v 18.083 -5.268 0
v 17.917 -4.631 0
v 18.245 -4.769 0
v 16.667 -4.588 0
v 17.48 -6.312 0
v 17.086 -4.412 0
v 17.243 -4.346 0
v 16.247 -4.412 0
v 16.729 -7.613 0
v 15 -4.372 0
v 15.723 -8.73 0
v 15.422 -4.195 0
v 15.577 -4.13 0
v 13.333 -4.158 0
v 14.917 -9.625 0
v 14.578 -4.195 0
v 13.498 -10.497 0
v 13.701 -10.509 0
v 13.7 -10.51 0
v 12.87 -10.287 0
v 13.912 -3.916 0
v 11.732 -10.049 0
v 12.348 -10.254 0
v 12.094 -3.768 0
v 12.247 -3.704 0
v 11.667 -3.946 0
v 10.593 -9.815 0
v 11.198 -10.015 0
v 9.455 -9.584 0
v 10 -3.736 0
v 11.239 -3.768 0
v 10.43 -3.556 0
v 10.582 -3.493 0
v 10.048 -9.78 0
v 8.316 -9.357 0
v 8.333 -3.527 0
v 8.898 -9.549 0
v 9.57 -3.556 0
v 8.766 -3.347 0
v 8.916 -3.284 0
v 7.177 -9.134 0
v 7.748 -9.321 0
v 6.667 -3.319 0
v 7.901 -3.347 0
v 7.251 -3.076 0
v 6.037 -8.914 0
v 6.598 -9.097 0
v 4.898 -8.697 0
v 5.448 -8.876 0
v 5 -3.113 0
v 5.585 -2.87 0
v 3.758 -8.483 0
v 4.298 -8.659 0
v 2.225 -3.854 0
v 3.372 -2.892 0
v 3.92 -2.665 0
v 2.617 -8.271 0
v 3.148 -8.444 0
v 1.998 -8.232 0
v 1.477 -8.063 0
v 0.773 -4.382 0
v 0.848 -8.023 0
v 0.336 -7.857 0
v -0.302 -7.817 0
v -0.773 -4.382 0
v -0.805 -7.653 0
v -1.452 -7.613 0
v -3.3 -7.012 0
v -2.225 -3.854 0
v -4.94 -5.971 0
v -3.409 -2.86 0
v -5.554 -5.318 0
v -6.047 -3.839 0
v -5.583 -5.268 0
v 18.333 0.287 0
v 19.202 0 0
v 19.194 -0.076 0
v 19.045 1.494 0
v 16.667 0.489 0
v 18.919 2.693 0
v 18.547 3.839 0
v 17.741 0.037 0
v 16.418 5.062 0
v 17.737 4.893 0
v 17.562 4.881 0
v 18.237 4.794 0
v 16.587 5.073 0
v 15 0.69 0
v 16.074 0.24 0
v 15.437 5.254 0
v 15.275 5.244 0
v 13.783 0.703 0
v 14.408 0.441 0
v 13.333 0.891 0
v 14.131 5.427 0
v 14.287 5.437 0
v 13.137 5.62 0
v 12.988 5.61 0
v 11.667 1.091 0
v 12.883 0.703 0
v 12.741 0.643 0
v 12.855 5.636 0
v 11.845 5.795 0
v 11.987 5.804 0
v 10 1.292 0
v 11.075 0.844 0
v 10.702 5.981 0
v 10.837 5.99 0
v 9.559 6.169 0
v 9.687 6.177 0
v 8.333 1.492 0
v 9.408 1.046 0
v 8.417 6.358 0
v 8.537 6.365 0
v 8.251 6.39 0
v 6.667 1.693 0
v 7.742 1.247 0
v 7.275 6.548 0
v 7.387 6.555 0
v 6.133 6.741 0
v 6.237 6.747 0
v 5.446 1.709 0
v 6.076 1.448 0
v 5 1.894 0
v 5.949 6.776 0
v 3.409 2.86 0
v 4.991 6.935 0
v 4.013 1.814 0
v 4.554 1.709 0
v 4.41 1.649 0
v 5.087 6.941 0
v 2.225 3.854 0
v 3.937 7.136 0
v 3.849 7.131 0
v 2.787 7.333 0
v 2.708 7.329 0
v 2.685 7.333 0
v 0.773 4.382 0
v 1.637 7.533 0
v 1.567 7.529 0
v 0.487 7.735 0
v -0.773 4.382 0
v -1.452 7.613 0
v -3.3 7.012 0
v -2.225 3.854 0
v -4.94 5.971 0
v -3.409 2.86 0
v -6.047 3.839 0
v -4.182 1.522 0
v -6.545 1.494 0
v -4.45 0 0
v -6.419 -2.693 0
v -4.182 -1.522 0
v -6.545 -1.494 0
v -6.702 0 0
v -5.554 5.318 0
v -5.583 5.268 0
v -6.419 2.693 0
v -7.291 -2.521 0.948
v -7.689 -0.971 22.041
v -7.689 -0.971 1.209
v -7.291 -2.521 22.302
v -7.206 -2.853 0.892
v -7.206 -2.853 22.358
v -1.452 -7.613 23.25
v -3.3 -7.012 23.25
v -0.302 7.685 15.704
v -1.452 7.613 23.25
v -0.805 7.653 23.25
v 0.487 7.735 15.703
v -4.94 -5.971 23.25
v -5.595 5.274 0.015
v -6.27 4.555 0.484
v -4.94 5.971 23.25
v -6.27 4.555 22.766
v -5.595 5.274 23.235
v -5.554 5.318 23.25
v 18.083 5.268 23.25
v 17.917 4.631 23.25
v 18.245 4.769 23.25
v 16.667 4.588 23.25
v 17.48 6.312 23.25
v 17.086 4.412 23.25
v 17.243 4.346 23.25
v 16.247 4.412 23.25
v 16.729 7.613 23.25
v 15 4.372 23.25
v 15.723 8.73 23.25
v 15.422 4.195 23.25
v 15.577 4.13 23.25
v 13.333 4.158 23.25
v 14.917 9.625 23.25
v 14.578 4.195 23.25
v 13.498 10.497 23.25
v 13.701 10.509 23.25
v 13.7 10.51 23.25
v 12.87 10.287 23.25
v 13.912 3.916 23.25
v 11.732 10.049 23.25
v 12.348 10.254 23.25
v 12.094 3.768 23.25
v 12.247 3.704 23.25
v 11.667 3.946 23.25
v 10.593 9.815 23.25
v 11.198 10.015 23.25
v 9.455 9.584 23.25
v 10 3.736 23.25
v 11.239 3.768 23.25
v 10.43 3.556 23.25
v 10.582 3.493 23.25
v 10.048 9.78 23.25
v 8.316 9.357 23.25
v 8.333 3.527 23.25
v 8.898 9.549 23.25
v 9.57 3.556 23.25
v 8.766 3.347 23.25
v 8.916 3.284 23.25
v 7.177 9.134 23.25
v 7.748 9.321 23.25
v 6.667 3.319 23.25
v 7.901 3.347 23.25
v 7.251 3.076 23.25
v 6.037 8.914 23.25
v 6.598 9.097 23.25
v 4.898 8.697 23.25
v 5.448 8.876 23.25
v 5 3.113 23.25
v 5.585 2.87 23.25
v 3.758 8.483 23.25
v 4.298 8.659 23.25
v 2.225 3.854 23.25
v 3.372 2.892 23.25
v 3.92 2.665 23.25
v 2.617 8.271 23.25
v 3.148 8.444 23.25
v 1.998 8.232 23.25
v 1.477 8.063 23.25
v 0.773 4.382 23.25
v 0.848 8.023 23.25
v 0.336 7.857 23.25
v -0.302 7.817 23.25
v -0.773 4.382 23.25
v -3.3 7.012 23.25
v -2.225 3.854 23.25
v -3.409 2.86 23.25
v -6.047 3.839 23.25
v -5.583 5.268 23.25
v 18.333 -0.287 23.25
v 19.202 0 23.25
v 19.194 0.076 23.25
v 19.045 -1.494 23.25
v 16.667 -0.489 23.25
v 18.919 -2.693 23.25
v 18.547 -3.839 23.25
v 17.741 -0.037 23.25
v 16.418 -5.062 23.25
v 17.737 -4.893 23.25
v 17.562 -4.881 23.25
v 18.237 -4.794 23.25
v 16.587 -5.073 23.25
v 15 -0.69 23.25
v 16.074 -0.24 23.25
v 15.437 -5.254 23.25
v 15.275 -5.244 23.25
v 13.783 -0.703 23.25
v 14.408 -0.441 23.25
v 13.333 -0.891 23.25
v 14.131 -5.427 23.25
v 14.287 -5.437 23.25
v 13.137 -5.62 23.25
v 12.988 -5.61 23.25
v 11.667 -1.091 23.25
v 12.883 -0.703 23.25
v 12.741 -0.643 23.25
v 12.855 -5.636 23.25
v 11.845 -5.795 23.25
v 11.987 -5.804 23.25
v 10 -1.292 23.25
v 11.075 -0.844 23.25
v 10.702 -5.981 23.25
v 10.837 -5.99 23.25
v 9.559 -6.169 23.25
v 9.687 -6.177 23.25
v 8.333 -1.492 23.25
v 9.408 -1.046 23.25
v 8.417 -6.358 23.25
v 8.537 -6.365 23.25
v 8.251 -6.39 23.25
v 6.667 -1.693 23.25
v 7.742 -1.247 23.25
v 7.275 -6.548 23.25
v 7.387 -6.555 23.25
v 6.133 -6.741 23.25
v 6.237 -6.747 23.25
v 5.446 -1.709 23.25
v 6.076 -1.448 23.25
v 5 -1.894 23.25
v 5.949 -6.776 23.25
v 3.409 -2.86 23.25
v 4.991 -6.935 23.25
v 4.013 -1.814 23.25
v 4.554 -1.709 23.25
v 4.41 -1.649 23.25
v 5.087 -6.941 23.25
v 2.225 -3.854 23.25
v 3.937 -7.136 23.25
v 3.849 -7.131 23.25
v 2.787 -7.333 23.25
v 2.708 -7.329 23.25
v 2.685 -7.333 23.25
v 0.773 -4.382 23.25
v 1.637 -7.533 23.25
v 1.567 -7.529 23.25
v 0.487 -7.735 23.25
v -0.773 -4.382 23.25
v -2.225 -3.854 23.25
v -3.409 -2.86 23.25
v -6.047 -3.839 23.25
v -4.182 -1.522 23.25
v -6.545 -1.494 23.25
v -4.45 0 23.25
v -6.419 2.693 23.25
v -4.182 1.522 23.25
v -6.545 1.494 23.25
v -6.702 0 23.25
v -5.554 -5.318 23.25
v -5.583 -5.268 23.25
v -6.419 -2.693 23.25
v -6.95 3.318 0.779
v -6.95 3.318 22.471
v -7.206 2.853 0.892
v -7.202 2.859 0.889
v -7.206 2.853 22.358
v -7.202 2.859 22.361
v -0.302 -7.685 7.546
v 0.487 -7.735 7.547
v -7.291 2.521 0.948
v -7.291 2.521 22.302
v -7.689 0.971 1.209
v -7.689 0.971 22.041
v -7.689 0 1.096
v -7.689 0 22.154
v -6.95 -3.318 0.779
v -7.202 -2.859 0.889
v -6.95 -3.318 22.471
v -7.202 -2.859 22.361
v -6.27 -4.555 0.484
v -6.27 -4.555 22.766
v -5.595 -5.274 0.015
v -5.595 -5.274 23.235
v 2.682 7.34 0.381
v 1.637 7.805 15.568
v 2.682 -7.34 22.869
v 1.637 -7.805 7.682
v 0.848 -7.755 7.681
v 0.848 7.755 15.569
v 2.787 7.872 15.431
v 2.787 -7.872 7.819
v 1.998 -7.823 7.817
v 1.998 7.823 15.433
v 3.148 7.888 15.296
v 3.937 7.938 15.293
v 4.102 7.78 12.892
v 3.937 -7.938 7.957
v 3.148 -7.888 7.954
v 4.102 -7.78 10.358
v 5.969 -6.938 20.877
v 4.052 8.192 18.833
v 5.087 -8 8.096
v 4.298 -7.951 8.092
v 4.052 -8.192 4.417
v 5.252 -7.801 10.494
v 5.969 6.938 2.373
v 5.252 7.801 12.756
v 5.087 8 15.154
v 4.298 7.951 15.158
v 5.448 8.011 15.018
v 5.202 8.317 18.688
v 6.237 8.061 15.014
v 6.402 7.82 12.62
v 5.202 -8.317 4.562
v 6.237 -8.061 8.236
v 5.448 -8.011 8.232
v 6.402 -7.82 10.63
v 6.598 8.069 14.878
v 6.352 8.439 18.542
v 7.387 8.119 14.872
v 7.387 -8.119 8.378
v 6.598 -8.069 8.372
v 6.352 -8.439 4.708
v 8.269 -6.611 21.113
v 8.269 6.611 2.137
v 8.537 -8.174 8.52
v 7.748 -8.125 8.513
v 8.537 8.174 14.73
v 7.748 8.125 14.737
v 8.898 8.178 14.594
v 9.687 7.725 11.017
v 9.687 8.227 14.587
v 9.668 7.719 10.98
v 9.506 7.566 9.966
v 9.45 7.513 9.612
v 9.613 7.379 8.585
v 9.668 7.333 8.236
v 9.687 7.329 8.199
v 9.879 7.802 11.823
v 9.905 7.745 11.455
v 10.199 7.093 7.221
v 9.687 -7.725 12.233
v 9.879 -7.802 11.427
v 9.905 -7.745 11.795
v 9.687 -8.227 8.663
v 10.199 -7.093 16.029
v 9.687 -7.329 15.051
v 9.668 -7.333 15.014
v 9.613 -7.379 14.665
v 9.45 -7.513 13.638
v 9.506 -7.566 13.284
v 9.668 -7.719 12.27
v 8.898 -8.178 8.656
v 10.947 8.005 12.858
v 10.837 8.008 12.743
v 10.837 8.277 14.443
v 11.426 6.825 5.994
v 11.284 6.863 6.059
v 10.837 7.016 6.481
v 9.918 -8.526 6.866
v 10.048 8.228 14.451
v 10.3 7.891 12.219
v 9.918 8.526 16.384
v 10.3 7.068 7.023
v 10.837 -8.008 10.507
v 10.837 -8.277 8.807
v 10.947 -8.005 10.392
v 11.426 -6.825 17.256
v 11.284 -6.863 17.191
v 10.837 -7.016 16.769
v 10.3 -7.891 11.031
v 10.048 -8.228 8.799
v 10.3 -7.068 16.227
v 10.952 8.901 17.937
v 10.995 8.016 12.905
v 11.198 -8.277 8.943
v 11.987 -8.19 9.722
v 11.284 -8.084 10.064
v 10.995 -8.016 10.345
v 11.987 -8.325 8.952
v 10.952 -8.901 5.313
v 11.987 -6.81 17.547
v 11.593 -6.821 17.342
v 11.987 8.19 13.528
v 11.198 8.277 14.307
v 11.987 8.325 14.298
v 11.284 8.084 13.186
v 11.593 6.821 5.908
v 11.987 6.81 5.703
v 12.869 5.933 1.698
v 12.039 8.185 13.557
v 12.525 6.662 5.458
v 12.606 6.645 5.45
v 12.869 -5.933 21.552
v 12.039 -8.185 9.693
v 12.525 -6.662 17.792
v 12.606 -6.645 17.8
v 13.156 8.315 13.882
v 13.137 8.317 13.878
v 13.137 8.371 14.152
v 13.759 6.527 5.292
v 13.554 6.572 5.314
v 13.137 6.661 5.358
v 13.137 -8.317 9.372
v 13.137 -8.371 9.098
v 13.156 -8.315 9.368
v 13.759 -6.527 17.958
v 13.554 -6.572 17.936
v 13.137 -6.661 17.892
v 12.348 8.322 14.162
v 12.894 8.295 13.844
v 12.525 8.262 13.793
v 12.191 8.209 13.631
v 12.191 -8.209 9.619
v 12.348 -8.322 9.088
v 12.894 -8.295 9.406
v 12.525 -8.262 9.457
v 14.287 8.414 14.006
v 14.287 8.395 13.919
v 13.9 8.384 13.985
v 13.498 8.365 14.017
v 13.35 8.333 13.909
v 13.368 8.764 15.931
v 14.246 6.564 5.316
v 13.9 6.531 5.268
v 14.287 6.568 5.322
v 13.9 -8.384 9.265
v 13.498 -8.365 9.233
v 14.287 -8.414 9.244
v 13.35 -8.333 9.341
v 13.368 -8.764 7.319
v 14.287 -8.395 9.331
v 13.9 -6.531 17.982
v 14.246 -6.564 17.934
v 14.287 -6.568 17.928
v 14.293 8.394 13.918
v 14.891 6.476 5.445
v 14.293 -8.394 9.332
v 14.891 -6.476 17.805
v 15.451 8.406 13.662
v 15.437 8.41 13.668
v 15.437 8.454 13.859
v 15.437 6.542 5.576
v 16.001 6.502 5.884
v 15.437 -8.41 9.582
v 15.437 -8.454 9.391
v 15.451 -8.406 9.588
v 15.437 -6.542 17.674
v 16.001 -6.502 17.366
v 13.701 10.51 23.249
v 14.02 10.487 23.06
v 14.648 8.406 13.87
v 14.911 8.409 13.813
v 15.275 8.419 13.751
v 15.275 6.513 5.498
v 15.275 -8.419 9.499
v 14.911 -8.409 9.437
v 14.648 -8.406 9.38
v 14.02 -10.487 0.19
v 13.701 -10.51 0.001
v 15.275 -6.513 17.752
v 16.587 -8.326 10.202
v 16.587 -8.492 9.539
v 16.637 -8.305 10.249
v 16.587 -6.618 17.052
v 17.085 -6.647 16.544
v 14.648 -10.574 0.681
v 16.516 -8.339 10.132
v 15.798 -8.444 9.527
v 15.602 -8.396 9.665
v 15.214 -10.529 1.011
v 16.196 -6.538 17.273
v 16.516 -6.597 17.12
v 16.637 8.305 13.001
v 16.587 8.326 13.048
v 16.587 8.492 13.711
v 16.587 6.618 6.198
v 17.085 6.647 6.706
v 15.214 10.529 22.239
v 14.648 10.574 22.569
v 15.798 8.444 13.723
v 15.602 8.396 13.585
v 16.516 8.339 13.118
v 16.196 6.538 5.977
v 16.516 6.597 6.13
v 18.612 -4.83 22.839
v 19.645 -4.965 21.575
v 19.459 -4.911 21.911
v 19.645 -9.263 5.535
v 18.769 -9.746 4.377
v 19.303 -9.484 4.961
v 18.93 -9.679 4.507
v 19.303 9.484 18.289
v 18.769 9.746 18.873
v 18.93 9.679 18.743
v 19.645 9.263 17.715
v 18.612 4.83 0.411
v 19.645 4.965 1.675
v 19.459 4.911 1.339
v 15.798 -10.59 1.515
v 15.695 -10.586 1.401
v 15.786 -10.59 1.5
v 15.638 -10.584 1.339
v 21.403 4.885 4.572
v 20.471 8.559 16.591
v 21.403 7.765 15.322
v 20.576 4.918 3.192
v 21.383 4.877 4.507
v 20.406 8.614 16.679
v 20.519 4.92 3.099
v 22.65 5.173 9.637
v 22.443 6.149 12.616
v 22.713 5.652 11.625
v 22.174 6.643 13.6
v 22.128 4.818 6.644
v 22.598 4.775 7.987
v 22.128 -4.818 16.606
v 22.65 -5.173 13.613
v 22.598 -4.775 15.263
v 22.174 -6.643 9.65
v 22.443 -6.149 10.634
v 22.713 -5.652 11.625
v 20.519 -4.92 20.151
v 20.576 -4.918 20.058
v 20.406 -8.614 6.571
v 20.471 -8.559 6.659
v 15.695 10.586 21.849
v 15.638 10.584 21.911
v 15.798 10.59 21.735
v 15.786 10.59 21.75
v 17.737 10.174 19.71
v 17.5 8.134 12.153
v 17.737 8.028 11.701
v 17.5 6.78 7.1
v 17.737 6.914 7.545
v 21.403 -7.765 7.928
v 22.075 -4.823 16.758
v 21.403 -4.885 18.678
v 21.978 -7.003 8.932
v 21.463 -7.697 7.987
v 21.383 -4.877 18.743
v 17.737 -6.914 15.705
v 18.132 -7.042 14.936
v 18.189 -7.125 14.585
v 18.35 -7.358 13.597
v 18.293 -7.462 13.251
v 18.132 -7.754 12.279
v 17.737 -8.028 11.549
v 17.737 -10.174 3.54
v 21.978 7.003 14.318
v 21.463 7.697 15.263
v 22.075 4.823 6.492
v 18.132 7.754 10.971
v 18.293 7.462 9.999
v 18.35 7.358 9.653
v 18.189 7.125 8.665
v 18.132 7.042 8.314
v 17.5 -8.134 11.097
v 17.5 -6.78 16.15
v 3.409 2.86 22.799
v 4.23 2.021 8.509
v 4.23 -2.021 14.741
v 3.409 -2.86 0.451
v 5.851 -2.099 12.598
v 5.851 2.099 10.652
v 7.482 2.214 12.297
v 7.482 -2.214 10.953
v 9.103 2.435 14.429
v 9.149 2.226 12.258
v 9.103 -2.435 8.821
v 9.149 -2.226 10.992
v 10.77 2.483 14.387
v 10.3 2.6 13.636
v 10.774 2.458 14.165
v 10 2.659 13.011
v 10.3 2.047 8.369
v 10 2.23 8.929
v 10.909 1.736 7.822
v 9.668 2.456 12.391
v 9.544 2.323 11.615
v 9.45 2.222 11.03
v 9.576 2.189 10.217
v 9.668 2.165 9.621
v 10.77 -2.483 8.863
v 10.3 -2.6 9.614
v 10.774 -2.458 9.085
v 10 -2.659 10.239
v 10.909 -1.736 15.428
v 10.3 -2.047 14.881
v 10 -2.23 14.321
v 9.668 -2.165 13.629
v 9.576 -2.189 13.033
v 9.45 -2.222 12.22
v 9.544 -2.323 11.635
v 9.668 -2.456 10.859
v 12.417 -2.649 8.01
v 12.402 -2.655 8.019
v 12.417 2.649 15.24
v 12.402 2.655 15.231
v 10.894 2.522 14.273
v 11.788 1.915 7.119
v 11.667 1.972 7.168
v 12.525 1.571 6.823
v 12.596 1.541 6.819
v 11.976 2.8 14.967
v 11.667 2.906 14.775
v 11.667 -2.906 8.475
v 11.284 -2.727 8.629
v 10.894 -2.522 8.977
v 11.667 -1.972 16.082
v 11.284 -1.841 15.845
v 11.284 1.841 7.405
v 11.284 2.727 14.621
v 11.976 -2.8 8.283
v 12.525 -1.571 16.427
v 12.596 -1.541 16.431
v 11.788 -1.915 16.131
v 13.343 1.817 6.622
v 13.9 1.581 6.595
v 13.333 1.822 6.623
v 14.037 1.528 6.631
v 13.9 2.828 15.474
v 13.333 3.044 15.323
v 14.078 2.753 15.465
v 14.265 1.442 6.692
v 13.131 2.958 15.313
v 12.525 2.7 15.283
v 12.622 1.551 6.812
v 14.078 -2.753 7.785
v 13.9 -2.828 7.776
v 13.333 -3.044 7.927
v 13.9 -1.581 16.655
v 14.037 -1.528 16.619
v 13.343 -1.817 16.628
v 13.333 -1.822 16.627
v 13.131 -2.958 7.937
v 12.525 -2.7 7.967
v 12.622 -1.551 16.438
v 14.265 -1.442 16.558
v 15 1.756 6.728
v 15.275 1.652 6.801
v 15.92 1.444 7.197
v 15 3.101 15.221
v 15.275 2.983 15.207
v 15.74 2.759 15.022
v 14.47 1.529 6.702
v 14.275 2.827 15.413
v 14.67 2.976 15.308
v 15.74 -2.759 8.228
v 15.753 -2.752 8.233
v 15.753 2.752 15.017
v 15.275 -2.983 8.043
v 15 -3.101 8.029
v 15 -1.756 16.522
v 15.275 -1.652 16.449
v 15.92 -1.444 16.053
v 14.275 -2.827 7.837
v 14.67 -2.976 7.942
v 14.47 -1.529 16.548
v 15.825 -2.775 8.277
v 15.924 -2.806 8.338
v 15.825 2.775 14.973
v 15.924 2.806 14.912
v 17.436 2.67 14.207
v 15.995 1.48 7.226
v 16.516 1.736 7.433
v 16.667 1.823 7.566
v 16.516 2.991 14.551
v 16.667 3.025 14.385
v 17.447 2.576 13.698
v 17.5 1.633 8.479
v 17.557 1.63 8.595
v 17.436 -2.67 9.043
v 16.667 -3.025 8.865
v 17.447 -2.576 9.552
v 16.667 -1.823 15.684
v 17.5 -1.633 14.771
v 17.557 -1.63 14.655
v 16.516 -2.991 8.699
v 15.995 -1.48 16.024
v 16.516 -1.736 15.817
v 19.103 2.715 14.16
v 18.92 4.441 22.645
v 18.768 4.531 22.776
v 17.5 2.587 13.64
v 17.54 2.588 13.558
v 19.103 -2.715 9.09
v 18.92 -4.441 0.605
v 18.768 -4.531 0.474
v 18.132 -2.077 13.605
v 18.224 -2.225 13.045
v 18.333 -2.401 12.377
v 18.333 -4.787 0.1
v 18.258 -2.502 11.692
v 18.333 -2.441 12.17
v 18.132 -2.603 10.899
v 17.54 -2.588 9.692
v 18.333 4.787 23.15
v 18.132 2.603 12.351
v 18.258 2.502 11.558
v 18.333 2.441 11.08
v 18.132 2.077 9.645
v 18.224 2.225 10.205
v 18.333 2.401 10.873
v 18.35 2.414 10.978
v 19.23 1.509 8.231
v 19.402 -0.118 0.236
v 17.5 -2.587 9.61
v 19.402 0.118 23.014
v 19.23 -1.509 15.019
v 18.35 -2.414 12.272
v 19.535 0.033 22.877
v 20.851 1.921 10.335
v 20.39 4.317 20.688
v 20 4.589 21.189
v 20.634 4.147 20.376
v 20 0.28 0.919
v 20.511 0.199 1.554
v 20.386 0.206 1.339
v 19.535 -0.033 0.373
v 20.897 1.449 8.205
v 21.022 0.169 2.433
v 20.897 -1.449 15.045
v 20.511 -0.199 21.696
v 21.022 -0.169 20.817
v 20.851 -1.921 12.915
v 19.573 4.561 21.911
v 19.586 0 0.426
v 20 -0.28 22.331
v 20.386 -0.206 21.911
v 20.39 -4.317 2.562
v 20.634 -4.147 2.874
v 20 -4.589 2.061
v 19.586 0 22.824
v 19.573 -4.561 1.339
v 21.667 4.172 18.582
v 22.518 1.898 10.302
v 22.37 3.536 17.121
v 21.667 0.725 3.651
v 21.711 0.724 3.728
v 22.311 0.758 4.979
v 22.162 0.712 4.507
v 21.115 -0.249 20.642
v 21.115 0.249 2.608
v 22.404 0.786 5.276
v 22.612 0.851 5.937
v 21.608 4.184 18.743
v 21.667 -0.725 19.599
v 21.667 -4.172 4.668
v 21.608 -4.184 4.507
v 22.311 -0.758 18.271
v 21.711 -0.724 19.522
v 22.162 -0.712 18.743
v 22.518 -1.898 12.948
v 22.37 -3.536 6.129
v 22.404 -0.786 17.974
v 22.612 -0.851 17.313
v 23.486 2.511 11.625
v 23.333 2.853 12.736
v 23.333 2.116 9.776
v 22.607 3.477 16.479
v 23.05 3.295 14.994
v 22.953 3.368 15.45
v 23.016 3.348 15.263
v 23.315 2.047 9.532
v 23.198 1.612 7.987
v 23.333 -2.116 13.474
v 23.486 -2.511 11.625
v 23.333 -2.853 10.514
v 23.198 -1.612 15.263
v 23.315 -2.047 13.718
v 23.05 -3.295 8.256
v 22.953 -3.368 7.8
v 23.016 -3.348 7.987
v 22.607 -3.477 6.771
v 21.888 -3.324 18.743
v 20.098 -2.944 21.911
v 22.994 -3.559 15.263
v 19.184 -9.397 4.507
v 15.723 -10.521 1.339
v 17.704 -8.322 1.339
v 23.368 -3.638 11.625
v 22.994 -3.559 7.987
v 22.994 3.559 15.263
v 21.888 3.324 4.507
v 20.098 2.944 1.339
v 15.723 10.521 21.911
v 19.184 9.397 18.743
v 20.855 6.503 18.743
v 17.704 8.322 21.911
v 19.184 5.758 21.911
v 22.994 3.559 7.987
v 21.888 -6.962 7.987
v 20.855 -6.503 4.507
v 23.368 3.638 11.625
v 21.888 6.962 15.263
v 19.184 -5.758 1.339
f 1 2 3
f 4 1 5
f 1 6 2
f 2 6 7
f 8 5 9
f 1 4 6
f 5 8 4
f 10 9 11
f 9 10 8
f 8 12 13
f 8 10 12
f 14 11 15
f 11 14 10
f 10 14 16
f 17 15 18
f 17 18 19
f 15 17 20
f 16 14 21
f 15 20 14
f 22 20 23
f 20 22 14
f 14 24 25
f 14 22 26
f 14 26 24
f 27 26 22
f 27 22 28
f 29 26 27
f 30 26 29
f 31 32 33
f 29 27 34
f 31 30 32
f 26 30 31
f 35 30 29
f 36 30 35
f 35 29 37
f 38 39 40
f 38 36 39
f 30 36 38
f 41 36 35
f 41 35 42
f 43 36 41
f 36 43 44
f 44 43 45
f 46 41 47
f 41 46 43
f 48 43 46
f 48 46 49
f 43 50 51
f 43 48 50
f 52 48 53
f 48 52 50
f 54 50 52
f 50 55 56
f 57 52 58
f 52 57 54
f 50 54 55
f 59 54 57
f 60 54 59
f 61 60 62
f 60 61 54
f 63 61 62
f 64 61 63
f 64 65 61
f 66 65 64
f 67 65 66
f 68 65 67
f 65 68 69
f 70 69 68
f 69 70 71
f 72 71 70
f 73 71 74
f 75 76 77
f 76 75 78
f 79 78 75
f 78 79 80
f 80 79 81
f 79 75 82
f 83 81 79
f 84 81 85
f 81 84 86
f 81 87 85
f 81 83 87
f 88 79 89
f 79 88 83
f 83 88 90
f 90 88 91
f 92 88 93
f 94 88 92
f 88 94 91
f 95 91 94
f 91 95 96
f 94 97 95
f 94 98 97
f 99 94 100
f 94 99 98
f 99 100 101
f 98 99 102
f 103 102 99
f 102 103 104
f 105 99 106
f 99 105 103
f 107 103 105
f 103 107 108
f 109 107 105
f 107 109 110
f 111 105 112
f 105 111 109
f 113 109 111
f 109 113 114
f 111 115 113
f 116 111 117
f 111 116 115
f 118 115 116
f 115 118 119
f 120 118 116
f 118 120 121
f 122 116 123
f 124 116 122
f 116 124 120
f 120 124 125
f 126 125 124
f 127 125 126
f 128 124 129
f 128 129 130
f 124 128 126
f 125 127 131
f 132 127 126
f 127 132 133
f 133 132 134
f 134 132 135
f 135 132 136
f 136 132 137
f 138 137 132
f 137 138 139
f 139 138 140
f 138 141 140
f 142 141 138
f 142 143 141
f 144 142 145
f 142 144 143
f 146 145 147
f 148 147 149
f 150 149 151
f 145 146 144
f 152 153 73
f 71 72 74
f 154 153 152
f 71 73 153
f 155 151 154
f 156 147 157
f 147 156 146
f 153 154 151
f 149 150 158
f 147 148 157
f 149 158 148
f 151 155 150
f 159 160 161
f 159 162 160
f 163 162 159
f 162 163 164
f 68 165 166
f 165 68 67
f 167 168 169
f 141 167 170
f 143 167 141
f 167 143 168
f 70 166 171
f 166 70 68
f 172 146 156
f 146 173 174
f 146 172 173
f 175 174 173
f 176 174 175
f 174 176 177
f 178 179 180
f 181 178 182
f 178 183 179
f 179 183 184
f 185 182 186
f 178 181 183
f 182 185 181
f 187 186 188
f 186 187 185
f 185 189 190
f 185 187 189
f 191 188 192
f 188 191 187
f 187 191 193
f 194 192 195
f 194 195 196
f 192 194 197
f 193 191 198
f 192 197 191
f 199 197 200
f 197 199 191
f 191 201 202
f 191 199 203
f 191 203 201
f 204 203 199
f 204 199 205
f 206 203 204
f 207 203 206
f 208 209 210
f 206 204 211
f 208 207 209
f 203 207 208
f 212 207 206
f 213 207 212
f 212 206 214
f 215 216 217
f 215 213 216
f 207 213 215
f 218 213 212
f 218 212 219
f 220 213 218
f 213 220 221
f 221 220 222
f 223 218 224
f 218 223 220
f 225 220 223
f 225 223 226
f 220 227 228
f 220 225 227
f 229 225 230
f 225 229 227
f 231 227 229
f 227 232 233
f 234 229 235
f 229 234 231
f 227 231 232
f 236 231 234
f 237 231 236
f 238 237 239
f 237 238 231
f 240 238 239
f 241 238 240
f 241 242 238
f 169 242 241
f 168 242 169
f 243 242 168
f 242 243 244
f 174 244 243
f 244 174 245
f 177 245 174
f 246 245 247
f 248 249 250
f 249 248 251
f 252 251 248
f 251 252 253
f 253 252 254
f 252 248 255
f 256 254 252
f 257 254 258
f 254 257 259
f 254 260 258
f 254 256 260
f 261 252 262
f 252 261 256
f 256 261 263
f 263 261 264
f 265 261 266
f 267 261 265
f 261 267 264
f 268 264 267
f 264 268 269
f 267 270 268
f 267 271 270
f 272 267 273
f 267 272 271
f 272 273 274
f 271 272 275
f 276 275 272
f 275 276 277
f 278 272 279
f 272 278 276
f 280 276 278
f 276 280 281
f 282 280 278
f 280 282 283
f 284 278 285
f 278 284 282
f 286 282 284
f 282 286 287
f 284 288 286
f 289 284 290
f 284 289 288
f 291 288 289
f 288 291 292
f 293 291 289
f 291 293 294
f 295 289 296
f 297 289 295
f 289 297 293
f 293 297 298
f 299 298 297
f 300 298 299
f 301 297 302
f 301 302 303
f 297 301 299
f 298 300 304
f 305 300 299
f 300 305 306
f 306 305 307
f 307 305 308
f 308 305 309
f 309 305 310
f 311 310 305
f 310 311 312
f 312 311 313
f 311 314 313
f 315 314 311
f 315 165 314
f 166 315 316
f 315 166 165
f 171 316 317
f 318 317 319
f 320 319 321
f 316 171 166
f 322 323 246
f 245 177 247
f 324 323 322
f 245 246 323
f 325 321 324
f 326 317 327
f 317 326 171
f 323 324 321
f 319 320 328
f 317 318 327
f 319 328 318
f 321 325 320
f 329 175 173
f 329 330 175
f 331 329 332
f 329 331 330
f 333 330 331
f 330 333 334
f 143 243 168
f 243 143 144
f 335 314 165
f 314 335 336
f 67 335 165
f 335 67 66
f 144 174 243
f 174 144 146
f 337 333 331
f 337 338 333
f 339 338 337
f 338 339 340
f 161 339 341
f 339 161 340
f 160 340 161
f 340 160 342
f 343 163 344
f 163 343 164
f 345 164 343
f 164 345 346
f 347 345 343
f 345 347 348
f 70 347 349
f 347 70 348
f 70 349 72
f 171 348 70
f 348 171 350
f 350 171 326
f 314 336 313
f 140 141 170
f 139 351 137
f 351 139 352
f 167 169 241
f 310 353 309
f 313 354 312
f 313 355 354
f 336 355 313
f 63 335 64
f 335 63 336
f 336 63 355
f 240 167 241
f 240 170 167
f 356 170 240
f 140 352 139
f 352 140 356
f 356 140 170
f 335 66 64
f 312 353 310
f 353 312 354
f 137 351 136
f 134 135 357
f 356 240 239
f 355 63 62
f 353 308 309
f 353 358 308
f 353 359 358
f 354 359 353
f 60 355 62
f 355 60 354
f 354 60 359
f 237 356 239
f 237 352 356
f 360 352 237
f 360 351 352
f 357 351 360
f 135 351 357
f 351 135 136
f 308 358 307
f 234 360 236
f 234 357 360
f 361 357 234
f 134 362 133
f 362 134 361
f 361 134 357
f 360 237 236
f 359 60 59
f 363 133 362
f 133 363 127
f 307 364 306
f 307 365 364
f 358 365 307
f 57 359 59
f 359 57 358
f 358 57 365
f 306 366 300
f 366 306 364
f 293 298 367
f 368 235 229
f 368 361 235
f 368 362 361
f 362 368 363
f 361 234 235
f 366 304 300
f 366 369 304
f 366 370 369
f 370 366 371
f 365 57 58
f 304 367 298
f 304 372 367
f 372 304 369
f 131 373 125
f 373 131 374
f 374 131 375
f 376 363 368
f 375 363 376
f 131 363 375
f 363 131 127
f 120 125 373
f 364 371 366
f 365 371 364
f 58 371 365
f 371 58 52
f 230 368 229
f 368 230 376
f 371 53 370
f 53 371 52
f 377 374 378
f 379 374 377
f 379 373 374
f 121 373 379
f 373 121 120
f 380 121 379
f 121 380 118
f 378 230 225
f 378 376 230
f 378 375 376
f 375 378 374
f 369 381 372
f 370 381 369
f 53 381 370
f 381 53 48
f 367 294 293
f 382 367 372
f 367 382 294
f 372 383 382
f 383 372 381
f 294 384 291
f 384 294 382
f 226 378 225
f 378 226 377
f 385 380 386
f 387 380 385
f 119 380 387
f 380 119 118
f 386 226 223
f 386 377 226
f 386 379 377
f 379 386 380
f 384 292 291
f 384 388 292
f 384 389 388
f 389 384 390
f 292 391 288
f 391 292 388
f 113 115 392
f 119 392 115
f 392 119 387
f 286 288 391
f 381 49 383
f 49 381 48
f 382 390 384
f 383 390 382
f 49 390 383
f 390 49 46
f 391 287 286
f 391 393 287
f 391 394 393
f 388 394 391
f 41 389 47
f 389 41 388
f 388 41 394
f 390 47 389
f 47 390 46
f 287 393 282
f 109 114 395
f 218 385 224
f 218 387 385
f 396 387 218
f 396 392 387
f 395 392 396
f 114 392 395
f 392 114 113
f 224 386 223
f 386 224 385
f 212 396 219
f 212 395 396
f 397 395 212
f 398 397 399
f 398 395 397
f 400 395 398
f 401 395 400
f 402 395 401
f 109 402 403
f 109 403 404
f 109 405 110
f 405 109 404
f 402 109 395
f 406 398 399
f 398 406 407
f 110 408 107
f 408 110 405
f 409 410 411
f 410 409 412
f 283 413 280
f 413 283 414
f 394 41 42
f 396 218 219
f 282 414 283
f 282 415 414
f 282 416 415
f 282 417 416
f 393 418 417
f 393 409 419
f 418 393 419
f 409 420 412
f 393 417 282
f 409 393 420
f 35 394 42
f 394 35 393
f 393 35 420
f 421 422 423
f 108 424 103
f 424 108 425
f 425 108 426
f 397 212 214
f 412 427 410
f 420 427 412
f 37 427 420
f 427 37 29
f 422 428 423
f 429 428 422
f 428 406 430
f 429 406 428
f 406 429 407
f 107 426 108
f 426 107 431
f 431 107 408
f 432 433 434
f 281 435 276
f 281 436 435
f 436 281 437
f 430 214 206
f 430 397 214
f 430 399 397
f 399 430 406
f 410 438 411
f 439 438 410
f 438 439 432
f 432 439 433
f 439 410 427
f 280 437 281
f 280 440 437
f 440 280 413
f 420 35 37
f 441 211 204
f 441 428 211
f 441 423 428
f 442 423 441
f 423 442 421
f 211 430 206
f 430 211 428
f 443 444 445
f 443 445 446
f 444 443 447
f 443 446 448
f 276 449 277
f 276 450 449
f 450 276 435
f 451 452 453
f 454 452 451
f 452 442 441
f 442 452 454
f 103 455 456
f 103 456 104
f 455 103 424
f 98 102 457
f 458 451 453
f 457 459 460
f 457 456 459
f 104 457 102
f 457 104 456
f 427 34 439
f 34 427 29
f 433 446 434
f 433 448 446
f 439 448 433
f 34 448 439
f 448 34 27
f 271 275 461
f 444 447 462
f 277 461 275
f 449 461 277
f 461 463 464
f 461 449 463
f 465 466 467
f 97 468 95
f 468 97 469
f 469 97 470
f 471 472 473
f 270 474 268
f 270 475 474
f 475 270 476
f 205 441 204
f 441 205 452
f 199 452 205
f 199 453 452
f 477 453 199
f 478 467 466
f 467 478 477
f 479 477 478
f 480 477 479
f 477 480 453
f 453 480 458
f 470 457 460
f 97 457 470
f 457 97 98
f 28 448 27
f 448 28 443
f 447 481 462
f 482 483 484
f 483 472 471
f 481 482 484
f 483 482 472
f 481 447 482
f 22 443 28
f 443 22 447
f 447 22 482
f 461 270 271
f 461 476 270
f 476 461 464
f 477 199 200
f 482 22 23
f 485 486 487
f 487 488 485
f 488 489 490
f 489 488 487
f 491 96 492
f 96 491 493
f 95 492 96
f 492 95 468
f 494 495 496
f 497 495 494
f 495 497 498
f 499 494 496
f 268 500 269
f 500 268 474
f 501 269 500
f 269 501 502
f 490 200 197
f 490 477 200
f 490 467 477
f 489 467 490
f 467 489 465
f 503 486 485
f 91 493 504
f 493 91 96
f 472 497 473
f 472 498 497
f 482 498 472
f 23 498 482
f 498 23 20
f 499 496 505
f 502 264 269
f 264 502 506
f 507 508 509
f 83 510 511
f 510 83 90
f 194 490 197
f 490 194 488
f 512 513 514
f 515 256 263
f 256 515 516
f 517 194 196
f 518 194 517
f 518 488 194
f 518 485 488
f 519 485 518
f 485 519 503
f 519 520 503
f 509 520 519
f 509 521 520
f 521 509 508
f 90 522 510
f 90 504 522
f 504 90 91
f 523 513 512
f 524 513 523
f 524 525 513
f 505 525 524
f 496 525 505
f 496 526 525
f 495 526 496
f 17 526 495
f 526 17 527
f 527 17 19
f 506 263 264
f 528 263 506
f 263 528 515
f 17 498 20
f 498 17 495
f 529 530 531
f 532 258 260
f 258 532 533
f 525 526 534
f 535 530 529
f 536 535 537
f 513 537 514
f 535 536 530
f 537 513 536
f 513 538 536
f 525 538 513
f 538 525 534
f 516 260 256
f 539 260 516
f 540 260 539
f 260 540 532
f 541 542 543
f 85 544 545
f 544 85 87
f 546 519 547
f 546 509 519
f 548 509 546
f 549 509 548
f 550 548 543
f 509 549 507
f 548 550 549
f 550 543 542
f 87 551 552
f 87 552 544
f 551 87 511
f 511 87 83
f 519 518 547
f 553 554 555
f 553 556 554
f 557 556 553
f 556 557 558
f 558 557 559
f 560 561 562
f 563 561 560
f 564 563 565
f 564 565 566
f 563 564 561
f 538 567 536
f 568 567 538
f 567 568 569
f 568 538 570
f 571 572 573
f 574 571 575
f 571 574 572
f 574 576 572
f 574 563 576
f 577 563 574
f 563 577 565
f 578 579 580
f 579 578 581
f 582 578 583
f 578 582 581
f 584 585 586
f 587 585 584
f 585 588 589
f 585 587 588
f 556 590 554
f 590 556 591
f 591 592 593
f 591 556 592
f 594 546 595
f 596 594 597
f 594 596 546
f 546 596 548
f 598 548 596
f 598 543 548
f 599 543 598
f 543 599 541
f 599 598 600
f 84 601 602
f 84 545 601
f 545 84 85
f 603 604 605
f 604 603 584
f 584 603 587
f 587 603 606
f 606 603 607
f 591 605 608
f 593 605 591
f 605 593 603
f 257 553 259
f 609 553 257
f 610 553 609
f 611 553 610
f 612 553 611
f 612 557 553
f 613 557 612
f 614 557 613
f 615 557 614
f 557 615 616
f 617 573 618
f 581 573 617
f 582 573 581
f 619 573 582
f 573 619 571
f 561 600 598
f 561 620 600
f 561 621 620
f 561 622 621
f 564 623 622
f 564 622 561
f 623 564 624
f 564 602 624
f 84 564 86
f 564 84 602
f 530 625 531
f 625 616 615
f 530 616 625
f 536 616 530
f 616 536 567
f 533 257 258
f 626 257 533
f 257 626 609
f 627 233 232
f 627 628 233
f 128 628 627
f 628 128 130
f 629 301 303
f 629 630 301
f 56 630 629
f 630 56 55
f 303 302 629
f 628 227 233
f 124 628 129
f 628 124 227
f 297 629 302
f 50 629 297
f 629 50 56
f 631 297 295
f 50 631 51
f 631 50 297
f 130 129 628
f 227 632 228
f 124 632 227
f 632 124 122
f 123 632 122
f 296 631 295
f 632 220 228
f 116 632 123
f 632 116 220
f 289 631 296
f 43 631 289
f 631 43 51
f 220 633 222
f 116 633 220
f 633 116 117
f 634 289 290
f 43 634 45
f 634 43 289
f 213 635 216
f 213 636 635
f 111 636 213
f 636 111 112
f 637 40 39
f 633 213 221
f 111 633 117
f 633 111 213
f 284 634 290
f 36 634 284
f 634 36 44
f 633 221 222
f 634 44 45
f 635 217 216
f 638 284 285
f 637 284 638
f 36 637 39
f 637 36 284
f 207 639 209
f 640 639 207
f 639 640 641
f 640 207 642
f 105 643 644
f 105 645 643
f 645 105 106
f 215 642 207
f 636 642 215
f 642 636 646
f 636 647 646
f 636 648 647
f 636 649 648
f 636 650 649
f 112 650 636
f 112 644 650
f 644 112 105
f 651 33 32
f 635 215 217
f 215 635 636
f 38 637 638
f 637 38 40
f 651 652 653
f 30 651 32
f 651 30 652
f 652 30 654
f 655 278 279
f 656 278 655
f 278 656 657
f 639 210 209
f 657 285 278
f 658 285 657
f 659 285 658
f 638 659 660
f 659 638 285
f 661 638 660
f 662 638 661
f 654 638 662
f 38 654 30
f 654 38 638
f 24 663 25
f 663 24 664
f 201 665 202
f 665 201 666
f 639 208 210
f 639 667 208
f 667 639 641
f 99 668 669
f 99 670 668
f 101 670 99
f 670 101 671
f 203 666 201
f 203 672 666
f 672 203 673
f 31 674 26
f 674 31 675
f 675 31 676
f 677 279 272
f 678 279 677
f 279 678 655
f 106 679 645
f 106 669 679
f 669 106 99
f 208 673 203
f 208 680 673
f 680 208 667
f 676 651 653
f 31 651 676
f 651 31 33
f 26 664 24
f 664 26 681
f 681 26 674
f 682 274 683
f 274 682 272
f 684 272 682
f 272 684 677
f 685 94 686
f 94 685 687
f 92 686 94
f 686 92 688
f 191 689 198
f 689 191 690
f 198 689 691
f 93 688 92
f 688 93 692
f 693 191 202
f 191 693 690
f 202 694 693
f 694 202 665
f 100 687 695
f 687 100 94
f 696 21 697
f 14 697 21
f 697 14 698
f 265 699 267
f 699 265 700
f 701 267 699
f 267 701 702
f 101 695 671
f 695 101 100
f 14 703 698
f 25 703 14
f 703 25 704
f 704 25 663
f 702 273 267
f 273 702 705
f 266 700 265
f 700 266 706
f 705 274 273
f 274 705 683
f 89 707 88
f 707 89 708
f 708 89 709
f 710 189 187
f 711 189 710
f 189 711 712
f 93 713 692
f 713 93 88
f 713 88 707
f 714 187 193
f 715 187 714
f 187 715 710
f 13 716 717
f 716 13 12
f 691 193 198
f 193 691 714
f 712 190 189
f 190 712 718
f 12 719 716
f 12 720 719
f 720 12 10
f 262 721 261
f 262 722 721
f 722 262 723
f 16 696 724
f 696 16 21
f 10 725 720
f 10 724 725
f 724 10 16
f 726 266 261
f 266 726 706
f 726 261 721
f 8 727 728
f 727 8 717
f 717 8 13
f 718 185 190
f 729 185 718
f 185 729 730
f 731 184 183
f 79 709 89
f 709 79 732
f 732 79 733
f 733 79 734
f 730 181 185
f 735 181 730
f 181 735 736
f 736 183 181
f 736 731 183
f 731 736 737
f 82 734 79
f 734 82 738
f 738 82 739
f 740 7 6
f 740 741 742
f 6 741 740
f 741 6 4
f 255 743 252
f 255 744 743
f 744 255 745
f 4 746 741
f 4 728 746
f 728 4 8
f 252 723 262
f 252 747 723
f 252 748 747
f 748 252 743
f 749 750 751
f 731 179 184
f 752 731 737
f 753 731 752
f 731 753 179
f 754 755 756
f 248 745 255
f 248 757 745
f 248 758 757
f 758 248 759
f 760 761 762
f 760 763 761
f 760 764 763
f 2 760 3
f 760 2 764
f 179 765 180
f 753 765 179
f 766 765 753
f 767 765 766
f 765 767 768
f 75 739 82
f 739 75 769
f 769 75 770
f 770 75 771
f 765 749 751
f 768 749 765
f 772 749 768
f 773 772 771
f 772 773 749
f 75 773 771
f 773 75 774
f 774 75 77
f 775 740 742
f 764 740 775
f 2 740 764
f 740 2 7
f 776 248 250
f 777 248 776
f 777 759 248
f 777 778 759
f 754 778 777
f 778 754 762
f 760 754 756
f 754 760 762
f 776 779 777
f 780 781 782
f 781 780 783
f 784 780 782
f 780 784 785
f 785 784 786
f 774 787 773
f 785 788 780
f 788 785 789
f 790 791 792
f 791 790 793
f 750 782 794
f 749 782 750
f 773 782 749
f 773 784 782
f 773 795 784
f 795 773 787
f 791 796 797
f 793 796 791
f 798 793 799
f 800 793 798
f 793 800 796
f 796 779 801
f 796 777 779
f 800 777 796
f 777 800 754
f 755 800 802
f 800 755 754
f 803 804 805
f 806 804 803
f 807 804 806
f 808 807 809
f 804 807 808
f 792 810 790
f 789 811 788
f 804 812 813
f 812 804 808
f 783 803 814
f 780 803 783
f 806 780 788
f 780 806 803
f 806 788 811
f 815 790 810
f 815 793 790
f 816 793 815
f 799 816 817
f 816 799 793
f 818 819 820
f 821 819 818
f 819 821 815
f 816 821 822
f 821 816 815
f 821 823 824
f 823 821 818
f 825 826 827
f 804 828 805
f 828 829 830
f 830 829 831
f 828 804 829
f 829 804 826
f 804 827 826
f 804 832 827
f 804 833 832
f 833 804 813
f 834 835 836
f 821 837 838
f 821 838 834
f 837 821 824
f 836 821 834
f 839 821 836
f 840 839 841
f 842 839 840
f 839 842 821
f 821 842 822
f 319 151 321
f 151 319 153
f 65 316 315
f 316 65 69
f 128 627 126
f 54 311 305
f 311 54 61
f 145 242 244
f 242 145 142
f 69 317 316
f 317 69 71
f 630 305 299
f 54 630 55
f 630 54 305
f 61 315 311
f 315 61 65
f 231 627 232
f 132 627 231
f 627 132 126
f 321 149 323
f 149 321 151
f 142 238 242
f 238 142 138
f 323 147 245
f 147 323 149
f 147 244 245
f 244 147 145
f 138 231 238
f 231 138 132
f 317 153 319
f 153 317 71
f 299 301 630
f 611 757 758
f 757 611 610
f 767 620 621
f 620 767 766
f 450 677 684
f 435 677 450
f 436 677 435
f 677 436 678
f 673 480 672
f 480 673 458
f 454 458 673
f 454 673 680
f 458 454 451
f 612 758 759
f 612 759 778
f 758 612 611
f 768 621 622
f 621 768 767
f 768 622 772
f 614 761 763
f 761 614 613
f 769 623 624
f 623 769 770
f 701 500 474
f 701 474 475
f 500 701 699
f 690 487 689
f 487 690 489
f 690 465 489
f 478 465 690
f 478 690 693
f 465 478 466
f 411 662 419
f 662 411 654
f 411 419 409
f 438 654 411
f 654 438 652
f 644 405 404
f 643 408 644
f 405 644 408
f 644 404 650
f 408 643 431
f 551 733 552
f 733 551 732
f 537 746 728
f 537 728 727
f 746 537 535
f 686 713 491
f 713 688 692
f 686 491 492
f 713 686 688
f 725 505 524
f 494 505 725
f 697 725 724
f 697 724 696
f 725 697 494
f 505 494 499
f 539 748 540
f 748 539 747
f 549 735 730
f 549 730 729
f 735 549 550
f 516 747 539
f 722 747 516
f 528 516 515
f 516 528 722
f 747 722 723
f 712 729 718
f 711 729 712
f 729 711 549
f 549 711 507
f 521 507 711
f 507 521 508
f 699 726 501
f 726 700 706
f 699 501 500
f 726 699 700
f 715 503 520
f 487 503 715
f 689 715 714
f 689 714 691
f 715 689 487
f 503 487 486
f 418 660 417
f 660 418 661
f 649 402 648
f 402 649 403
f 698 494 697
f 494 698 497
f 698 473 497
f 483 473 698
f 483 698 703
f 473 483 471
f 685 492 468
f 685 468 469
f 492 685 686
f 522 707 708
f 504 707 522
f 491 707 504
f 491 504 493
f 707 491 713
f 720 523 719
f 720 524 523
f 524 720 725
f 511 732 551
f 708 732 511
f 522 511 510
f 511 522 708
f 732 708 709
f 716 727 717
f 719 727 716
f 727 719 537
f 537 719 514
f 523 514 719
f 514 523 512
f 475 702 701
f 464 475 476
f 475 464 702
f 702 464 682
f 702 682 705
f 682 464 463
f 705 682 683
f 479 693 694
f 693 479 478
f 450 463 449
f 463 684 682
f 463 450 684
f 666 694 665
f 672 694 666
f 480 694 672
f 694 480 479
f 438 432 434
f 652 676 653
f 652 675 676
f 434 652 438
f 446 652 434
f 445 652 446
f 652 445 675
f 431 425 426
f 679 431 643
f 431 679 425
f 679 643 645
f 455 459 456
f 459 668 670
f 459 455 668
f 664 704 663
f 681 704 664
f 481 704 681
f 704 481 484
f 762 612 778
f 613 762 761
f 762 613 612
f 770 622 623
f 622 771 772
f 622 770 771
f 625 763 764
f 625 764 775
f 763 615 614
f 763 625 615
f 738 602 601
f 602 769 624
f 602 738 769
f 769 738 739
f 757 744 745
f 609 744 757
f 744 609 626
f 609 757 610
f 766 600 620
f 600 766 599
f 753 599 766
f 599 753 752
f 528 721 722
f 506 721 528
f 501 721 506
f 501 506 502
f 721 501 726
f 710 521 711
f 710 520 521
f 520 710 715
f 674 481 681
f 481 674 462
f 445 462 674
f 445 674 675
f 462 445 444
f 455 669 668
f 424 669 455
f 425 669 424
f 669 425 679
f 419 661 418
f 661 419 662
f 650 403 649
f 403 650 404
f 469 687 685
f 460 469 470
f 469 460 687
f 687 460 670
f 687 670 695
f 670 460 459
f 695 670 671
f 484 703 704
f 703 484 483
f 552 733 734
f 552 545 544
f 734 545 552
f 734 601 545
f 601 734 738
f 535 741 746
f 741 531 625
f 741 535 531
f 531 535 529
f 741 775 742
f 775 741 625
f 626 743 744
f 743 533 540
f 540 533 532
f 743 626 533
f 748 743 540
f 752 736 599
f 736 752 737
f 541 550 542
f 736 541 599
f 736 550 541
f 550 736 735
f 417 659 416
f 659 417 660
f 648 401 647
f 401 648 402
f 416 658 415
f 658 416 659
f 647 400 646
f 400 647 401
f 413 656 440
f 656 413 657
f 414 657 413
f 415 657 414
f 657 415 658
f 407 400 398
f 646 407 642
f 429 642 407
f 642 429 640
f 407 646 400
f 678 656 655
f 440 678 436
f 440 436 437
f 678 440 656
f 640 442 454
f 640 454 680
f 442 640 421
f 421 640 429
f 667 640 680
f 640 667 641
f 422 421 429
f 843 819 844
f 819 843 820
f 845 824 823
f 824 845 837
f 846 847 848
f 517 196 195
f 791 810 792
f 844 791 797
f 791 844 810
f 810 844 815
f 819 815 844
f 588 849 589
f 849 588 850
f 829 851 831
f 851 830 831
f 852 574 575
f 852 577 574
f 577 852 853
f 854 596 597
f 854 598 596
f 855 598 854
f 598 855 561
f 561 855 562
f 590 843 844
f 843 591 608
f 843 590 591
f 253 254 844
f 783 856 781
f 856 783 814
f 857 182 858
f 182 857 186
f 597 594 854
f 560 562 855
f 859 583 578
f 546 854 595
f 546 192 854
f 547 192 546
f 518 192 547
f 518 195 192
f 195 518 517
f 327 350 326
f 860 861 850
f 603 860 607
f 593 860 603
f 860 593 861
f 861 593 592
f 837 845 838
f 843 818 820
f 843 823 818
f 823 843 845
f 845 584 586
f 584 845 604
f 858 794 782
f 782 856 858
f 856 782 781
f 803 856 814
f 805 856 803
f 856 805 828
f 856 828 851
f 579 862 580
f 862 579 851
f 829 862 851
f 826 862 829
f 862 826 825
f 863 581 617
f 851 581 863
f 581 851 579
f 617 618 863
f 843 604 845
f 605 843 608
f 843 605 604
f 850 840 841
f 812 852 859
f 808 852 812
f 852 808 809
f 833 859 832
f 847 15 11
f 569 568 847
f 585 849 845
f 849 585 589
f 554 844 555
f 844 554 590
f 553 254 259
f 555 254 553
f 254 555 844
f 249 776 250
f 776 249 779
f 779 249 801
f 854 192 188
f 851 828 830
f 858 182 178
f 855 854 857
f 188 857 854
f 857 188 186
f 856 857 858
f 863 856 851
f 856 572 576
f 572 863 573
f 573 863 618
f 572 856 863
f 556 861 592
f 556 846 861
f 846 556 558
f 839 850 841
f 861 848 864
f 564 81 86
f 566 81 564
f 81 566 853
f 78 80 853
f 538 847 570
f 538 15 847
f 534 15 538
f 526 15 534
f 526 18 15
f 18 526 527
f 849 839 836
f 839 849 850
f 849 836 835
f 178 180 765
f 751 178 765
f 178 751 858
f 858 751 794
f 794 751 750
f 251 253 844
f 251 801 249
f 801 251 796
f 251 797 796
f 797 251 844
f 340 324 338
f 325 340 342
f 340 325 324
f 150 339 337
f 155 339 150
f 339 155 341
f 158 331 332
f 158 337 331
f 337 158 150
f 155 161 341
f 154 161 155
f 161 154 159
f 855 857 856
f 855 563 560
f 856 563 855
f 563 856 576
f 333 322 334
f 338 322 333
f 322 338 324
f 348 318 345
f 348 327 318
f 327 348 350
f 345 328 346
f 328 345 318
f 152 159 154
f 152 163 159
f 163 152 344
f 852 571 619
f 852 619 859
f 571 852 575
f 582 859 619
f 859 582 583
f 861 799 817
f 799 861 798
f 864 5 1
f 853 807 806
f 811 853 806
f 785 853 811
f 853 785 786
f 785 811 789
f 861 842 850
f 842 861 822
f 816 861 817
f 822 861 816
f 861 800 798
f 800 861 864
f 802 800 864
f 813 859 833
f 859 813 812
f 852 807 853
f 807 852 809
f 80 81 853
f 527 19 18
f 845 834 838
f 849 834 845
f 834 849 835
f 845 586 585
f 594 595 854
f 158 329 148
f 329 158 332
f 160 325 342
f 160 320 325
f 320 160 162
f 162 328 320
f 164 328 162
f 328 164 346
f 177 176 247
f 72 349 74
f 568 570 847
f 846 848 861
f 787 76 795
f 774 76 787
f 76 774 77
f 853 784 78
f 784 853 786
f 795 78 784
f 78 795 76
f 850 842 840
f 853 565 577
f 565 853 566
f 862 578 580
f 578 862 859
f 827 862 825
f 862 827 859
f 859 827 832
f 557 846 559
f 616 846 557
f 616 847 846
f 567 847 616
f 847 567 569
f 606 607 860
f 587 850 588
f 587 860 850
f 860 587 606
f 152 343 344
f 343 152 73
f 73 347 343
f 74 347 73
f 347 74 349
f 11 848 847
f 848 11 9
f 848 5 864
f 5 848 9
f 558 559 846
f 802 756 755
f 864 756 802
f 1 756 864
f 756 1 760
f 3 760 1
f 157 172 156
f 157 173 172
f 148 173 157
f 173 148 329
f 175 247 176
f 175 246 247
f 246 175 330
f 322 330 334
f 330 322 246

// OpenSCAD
// file: teardrop.scad
teardrop();

module teardrop (r=4.5,h=20,top_and_bottom=false)
{
	rotate([-270,0,90])
	linear_extrude(height=h,convexity=10)
	{
		circle(r=r);
		polygon(points=[[0,0],[r*cos(30),r*sin(30)],[0.5*r,r],[-0.5*r,r],[-r*cos(30),r*sin(30)]],
				paths=[[0,1,2,3,4]]);
		if (top_and_bottom)
		polygon(points=[[0,0],[r*cos(30),-r*sin(30)],[0.5*r,-r],[-0.5*r,-r],[-r*cos(30),-r*sin(30)]],
				paths=[[0,1,2,3,4]]);
		
	}
}

module teardropcentering (r=4.5,h=20)
{
	rotate([-270,0,90])
	linear_extrude(height=h)
	{
		circle(r=r, $fn = 24);
		polygon(points=[[0,0],[r*cos(30),r*sin(30)],[0.5*r,1.2*r],[-0.5*r,1.2*r],[-r*cos(30),r*sin(30)]],
				paths=[[0,1,2,3,4]]);
	}
}

module teardropcentering2 (r=4.5,h=20)
{
	//rotate([-270,0,90])
	difference(){
	linear_extrude(height=h)
	{
		circle(r=r, $fn = 24);
		polygon(points=[[0,0],[r*cos(30),r*sin(30)],[0.5*r,1.2*r],[-0.5*r,1.2*r],[-r*cos(30),r*sin(30)]],
				paths=[[0,1,2,3,4]]);
	}
	translate(v = [-1.5*r, -1.5*r,-1])cube(size =[3*r,1.5*r,h+2]);
	}
}
// file: metric.scad
// PRUSA Mendel  
// Default metric sizes
// GNU GPL v2
// Josef Průša
// josefprusa@me.com
// prusadjs.cz
// http://www.reprap.org/wiki/Prusa_Mendel
// http://github.com/prusajr/PrusaMendel

// RODS

threaded_rod_diameter      = 8.2;
smooth_bar_diameter        = 8;

// Nuts and bolts
// For all nuttraps and screw holse 
m8_diameter                = 8.9;
m8_nut_diameter            = 15.3;
m8_nut_wallDist            = _wallDistFromDia(m8_nut_diameter);
m8_nut_heigth              = 6.3;

m4_diameter                = 4.5;
m4_nut_diameter            = 8.1;
m4_nut_heigth              = 3.2;

m3_diameter                = 3.6;
m3_nut_diameter            = 6.45;
m3_nut_heigth              = 2.3;
m3_nut_wallDist            = _wallDistFromDia(m3_nut_diameter);
m3_nut_diameter_horizontal = 6.1;

// elongetaed nuttraps
// where a nut is put in an slot and inthere hits the perpendicular threadhole
m3_elongNtt_tolerance      = [0.5,0,0.5];// additional [diameter,depth,height]  // depth is not implemented

// linear Bearings
lber_length                = 24;
lber_diam                  = 15.3;

// Motors

motor_shaft                = 5.5;


/******************************************************************************/ 
/*                                  INTERNAL                                  */
/******************************************************************************/
/*-----------------!!! do not change things below this !!!--------------------*/
m3_elongNtt_diameter = m3_nut_diameter + m3_elongNtt_tolerance[0];
m3_elongNtt_wallDist = _wallDistFromDia(m3_elongNtt_diameter);
m3_elongNtt_height = m3_nut_heigth + m3_elongNtt_tolerance[2];



function _wallDistFromDia(dia) = cos(30)*dia;
// main file
/* bar-clamp-cross
 * Copyright (c) 2012 by Krallinger Sebastian [s.krallinger+cc@gmail.com]
 * 
 * Creative Commons Attribution-ShareAlike 3.0 (CC BY-SA) [http://creativecommons.org/licenses/by-sa/3.0/]
 */

include <metric.scad>
use <teardrop.scad>

mode = "print";  // can be print or inspect [overlays the model with the original model] (uncomment next line)
//mode = "inspect";
//$fn=48;

module barclampCross(a=15) {
	genWallThickness = 3.3;
	outer_radius=m8_diameter/2+genWallThickness;
	clamp_width = outer_radius*2;
	clamp_length=25;
	clamp_height=3*outer_radius;
	axe_dist = 5;
	slot_width=5;
 
 	steps = 15;

 	translate([0, 0, clamp_height/2]) 
 	
 	intersection() {
 		translate([clamp_length/4, 0, 0]) 
 			sphere(r=clamp_length*7/10);

 		intersection() {
	 		union() {
	 			for (i=[0:steps]) {
	 				translate([i*(clamp_length-outer_radius)/steps, 0, 0])
	 					cylinder(h=clamp_height,r=outer_radius+i*0.3,center=true);
	 			}
	 			
	 		}

	 		difference() {
		 		union(){
		 			for (i=[0:steps]) {
						translate([i*(clamp_length-outer_radius)/steps, 0, 0]) rotate(a=-i*a/steps,v=[1,0,0]) 
							cylinder(h=clamp_height*10,r=outer_radius,center=true);
					}
		 			
		 		}
		 		union() {
			 		for (i=[0:steps]) {
						translate([i*clamp_length/steps, 0, 0]) rotate(a=-i*a/steps,v=[1,0,0]) 
							cylinder(r=slot_width/2, h=clamp_height*2, center=true);
					}


					#cylinder(h=clamp_height*2,r=m8_diameter/2,$fn=18,center=true);

					translate([axe_dist+m8_diameter,0,0]) 
					rotate([90-a,0,0]) 
					#cylinder(h=(clamp_width/cos(a))*2,r=m8_diameter/2,$fn=20,center=true);
			 	}
		 	}
	 	}
 	}
 	
 	
 	
 	
}
barclampCross(a=15);
